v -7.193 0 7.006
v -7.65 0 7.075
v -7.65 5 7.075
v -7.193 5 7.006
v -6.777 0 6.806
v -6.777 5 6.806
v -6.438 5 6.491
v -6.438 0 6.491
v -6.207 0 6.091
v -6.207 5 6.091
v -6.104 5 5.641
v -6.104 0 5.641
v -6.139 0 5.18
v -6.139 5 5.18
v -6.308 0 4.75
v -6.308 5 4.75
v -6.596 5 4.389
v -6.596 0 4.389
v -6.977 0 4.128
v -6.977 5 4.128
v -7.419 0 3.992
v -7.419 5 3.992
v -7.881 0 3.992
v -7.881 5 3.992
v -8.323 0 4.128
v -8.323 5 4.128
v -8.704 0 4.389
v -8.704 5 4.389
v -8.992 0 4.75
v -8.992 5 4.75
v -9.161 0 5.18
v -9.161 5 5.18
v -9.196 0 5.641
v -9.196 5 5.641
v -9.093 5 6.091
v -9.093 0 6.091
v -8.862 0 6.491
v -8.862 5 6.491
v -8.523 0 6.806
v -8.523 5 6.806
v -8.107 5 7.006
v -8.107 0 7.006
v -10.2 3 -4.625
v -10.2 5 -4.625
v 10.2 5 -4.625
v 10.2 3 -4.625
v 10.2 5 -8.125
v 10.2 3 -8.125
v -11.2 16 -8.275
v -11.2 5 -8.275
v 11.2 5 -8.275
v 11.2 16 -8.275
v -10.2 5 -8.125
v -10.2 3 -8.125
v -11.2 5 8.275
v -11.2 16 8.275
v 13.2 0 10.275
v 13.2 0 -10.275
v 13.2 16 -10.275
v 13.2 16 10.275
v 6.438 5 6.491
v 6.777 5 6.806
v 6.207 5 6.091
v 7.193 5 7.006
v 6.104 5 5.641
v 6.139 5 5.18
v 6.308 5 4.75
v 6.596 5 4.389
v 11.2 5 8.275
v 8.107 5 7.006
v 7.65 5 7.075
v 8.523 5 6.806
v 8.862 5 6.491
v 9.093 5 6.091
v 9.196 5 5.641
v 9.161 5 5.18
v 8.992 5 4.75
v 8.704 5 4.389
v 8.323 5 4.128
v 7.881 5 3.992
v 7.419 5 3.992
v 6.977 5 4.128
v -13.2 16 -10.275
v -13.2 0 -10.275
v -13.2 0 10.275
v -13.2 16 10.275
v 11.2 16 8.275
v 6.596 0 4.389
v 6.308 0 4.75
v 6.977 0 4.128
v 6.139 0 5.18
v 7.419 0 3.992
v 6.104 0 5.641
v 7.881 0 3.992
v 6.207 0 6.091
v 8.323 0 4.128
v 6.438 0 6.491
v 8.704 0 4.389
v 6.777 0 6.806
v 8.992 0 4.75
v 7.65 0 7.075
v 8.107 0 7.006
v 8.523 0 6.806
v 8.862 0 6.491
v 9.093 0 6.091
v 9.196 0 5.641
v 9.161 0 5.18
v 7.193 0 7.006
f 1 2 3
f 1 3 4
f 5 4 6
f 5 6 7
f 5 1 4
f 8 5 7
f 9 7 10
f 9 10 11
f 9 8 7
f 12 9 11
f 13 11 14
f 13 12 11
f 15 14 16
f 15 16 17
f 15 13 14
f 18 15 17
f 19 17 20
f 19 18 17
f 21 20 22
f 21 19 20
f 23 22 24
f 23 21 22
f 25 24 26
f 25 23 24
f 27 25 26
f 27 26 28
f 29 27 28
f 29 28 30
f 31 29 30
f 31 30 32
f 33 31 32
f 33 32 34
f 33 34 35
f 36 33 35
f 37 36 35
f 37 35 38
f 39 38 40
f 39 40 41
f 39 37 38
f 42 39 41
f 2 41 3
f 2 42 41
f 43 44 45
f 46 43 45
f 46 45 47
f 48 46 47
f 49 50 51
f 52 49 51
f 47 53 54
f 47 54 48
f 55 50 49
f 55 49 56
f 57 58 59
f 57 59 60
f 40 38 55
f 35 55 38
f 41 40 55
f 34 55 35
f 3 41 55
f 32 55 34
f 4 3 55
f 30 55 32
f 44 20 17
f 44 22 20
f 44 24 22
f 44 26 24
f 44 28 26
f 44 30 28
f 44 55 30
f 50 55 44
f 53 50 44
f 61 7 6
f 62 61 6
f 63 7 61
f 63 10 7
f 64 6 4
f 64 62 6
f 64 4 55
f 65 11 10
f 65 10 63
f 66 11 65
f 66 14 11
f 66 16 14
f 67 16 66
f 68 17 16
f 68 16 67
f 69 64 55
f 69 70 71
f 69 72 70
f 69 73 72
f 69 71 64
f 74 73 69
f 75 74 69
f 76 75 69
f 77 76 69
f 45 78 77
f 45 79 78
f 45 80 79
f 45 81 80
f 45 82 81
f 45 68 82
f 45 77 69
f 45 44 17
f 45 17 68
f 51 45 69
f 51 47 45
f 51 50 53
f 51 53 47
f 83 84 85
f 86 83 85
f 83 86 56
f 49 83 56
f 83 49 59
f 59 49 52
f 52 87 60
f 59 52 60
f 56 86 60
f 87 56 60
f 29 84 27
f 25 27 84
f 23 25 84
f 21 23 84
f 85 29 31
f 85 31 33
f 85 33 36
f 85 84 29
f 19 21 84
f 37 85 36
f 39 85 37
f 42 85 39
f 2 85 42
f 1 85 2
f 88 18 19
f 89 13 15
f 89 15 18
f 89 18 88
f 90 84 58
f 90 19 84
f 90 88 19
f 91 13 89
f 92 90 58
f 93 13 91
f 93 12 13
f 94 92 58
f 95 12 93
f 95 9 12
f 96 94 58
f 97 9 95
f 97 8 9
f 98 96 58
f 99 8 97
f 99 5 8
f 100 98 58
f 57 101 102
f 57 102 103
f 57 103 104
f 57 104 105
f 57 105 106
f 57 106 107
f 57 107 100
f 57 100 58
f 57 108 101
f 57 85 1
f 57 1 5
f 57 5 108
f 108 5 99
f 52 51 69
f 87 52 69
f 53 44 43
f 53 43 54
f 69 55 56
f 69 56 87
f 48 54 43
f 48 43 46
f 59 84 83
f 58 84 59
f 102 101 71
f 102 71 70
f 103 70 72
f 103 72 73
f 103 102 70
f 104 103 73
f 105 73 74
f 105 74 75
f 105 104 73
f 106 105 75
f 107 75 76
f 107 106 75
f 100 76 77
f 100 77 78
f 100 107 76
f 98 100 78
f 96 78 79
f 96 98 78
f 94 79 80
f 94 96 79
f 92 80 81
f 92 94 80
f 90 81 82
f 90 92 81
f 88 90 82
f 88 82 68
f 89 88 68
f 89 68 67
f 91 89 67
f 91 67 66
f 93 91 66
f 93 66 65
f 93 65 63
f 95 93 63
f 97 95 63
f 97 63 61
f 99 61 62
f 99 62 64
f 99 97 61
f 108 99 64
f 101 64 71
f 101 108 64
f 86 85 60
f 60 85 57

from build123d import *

# Parameters (mm, degrees)
SKETCH1_W           = 20.4
SKETCH1_H           = 16.55
SKETCH1_R           = 1.55
SKETCH1_W_2         = 1
BOSS_EXTRUDE1_DEPTH = 5
SKETCH2_W           = 20.4
SKETCH2_H           = 3.5
CUT_EXTRUDE1_DEPTH  = 2
SKETCH3_W           = 26.4
SKETCH3_H           = 20.55
SKETCH3_W_2         = 22.4
SKETCH3_H_2         = 16.55
BOSS_EXTRUDE2_DEPTH = 16


with BuildPart() as part:
    # Sketch1 → Boss-Extrude1 (new body)
    # profile 1 of 3: a face of its own
    with BuildSketch(Plane(origin=(0, 0, 0), x_dir=(1, 0, 0), z_dir=(0, 1, 0))):
        Rectangle(SKETCH1_W, SKETCH1_H)
        with Locations(Location((-7.65, -5.525, 0), (0, 0, 270))):
            Circle(SKETCH1_R, mode=Mode.SUBTRACT)
        with Locations(Location((7.65, -5.525, 0), (0, 0, 270))):
            Circle(SKETCH1_R, mode=Mode.SUBTRACT)
    # profile 2 of 3: a face of its own
    with BuildSketch(Plane(origin=(0, 0, 0), x_dir=(1, 0, 0), z_dir=(0, 1, 0))):
        with Locations((-10.7, 0)):
            Rectangle(SKETCH1_W_2, SKETCH1_H)
    # profile 3 of 3: a face of its own
    with BuildSketch(Plane(origin=(0, 0, 0), x_dir=(1, 0, 0), z_dir=(0, 1, 0))):
        with Locations((10.7, 0)):
            Rectangle(SKETCH1_W_2, SKETCH1_H)
    extrude(amount=BOSS_EXTRUDE1_DEPTH)

    # Sketch2 → Cut-Extrude1 (cut)
    with BuildSketch(Plane(origin=(0, 5, 0), x_dir=(1, 0, 0), z_dir=(0, 1, 0))):
        with Locations((0, 6.375)):
            Rectangle(SKETCH2_W, SKETCH2_H)
    extrude(amount=-CUT_EXTRUDE1_DEPTH, mode=Mode.SUBTRACT)

    # Sketch3 → Boss-Extrude2 (add)
    with BuildSketch(Plane.XZ):
        Rectangle(SKETCH3_W, SKETCH3_H)
        Rectangle(SKETCH3_W_2, SKETCH3_H_2, mode=Mode.SUBTRACT)
    extrude(amount=-BOSS_EXTRUDE2_DEPTH)


solid = part.part
